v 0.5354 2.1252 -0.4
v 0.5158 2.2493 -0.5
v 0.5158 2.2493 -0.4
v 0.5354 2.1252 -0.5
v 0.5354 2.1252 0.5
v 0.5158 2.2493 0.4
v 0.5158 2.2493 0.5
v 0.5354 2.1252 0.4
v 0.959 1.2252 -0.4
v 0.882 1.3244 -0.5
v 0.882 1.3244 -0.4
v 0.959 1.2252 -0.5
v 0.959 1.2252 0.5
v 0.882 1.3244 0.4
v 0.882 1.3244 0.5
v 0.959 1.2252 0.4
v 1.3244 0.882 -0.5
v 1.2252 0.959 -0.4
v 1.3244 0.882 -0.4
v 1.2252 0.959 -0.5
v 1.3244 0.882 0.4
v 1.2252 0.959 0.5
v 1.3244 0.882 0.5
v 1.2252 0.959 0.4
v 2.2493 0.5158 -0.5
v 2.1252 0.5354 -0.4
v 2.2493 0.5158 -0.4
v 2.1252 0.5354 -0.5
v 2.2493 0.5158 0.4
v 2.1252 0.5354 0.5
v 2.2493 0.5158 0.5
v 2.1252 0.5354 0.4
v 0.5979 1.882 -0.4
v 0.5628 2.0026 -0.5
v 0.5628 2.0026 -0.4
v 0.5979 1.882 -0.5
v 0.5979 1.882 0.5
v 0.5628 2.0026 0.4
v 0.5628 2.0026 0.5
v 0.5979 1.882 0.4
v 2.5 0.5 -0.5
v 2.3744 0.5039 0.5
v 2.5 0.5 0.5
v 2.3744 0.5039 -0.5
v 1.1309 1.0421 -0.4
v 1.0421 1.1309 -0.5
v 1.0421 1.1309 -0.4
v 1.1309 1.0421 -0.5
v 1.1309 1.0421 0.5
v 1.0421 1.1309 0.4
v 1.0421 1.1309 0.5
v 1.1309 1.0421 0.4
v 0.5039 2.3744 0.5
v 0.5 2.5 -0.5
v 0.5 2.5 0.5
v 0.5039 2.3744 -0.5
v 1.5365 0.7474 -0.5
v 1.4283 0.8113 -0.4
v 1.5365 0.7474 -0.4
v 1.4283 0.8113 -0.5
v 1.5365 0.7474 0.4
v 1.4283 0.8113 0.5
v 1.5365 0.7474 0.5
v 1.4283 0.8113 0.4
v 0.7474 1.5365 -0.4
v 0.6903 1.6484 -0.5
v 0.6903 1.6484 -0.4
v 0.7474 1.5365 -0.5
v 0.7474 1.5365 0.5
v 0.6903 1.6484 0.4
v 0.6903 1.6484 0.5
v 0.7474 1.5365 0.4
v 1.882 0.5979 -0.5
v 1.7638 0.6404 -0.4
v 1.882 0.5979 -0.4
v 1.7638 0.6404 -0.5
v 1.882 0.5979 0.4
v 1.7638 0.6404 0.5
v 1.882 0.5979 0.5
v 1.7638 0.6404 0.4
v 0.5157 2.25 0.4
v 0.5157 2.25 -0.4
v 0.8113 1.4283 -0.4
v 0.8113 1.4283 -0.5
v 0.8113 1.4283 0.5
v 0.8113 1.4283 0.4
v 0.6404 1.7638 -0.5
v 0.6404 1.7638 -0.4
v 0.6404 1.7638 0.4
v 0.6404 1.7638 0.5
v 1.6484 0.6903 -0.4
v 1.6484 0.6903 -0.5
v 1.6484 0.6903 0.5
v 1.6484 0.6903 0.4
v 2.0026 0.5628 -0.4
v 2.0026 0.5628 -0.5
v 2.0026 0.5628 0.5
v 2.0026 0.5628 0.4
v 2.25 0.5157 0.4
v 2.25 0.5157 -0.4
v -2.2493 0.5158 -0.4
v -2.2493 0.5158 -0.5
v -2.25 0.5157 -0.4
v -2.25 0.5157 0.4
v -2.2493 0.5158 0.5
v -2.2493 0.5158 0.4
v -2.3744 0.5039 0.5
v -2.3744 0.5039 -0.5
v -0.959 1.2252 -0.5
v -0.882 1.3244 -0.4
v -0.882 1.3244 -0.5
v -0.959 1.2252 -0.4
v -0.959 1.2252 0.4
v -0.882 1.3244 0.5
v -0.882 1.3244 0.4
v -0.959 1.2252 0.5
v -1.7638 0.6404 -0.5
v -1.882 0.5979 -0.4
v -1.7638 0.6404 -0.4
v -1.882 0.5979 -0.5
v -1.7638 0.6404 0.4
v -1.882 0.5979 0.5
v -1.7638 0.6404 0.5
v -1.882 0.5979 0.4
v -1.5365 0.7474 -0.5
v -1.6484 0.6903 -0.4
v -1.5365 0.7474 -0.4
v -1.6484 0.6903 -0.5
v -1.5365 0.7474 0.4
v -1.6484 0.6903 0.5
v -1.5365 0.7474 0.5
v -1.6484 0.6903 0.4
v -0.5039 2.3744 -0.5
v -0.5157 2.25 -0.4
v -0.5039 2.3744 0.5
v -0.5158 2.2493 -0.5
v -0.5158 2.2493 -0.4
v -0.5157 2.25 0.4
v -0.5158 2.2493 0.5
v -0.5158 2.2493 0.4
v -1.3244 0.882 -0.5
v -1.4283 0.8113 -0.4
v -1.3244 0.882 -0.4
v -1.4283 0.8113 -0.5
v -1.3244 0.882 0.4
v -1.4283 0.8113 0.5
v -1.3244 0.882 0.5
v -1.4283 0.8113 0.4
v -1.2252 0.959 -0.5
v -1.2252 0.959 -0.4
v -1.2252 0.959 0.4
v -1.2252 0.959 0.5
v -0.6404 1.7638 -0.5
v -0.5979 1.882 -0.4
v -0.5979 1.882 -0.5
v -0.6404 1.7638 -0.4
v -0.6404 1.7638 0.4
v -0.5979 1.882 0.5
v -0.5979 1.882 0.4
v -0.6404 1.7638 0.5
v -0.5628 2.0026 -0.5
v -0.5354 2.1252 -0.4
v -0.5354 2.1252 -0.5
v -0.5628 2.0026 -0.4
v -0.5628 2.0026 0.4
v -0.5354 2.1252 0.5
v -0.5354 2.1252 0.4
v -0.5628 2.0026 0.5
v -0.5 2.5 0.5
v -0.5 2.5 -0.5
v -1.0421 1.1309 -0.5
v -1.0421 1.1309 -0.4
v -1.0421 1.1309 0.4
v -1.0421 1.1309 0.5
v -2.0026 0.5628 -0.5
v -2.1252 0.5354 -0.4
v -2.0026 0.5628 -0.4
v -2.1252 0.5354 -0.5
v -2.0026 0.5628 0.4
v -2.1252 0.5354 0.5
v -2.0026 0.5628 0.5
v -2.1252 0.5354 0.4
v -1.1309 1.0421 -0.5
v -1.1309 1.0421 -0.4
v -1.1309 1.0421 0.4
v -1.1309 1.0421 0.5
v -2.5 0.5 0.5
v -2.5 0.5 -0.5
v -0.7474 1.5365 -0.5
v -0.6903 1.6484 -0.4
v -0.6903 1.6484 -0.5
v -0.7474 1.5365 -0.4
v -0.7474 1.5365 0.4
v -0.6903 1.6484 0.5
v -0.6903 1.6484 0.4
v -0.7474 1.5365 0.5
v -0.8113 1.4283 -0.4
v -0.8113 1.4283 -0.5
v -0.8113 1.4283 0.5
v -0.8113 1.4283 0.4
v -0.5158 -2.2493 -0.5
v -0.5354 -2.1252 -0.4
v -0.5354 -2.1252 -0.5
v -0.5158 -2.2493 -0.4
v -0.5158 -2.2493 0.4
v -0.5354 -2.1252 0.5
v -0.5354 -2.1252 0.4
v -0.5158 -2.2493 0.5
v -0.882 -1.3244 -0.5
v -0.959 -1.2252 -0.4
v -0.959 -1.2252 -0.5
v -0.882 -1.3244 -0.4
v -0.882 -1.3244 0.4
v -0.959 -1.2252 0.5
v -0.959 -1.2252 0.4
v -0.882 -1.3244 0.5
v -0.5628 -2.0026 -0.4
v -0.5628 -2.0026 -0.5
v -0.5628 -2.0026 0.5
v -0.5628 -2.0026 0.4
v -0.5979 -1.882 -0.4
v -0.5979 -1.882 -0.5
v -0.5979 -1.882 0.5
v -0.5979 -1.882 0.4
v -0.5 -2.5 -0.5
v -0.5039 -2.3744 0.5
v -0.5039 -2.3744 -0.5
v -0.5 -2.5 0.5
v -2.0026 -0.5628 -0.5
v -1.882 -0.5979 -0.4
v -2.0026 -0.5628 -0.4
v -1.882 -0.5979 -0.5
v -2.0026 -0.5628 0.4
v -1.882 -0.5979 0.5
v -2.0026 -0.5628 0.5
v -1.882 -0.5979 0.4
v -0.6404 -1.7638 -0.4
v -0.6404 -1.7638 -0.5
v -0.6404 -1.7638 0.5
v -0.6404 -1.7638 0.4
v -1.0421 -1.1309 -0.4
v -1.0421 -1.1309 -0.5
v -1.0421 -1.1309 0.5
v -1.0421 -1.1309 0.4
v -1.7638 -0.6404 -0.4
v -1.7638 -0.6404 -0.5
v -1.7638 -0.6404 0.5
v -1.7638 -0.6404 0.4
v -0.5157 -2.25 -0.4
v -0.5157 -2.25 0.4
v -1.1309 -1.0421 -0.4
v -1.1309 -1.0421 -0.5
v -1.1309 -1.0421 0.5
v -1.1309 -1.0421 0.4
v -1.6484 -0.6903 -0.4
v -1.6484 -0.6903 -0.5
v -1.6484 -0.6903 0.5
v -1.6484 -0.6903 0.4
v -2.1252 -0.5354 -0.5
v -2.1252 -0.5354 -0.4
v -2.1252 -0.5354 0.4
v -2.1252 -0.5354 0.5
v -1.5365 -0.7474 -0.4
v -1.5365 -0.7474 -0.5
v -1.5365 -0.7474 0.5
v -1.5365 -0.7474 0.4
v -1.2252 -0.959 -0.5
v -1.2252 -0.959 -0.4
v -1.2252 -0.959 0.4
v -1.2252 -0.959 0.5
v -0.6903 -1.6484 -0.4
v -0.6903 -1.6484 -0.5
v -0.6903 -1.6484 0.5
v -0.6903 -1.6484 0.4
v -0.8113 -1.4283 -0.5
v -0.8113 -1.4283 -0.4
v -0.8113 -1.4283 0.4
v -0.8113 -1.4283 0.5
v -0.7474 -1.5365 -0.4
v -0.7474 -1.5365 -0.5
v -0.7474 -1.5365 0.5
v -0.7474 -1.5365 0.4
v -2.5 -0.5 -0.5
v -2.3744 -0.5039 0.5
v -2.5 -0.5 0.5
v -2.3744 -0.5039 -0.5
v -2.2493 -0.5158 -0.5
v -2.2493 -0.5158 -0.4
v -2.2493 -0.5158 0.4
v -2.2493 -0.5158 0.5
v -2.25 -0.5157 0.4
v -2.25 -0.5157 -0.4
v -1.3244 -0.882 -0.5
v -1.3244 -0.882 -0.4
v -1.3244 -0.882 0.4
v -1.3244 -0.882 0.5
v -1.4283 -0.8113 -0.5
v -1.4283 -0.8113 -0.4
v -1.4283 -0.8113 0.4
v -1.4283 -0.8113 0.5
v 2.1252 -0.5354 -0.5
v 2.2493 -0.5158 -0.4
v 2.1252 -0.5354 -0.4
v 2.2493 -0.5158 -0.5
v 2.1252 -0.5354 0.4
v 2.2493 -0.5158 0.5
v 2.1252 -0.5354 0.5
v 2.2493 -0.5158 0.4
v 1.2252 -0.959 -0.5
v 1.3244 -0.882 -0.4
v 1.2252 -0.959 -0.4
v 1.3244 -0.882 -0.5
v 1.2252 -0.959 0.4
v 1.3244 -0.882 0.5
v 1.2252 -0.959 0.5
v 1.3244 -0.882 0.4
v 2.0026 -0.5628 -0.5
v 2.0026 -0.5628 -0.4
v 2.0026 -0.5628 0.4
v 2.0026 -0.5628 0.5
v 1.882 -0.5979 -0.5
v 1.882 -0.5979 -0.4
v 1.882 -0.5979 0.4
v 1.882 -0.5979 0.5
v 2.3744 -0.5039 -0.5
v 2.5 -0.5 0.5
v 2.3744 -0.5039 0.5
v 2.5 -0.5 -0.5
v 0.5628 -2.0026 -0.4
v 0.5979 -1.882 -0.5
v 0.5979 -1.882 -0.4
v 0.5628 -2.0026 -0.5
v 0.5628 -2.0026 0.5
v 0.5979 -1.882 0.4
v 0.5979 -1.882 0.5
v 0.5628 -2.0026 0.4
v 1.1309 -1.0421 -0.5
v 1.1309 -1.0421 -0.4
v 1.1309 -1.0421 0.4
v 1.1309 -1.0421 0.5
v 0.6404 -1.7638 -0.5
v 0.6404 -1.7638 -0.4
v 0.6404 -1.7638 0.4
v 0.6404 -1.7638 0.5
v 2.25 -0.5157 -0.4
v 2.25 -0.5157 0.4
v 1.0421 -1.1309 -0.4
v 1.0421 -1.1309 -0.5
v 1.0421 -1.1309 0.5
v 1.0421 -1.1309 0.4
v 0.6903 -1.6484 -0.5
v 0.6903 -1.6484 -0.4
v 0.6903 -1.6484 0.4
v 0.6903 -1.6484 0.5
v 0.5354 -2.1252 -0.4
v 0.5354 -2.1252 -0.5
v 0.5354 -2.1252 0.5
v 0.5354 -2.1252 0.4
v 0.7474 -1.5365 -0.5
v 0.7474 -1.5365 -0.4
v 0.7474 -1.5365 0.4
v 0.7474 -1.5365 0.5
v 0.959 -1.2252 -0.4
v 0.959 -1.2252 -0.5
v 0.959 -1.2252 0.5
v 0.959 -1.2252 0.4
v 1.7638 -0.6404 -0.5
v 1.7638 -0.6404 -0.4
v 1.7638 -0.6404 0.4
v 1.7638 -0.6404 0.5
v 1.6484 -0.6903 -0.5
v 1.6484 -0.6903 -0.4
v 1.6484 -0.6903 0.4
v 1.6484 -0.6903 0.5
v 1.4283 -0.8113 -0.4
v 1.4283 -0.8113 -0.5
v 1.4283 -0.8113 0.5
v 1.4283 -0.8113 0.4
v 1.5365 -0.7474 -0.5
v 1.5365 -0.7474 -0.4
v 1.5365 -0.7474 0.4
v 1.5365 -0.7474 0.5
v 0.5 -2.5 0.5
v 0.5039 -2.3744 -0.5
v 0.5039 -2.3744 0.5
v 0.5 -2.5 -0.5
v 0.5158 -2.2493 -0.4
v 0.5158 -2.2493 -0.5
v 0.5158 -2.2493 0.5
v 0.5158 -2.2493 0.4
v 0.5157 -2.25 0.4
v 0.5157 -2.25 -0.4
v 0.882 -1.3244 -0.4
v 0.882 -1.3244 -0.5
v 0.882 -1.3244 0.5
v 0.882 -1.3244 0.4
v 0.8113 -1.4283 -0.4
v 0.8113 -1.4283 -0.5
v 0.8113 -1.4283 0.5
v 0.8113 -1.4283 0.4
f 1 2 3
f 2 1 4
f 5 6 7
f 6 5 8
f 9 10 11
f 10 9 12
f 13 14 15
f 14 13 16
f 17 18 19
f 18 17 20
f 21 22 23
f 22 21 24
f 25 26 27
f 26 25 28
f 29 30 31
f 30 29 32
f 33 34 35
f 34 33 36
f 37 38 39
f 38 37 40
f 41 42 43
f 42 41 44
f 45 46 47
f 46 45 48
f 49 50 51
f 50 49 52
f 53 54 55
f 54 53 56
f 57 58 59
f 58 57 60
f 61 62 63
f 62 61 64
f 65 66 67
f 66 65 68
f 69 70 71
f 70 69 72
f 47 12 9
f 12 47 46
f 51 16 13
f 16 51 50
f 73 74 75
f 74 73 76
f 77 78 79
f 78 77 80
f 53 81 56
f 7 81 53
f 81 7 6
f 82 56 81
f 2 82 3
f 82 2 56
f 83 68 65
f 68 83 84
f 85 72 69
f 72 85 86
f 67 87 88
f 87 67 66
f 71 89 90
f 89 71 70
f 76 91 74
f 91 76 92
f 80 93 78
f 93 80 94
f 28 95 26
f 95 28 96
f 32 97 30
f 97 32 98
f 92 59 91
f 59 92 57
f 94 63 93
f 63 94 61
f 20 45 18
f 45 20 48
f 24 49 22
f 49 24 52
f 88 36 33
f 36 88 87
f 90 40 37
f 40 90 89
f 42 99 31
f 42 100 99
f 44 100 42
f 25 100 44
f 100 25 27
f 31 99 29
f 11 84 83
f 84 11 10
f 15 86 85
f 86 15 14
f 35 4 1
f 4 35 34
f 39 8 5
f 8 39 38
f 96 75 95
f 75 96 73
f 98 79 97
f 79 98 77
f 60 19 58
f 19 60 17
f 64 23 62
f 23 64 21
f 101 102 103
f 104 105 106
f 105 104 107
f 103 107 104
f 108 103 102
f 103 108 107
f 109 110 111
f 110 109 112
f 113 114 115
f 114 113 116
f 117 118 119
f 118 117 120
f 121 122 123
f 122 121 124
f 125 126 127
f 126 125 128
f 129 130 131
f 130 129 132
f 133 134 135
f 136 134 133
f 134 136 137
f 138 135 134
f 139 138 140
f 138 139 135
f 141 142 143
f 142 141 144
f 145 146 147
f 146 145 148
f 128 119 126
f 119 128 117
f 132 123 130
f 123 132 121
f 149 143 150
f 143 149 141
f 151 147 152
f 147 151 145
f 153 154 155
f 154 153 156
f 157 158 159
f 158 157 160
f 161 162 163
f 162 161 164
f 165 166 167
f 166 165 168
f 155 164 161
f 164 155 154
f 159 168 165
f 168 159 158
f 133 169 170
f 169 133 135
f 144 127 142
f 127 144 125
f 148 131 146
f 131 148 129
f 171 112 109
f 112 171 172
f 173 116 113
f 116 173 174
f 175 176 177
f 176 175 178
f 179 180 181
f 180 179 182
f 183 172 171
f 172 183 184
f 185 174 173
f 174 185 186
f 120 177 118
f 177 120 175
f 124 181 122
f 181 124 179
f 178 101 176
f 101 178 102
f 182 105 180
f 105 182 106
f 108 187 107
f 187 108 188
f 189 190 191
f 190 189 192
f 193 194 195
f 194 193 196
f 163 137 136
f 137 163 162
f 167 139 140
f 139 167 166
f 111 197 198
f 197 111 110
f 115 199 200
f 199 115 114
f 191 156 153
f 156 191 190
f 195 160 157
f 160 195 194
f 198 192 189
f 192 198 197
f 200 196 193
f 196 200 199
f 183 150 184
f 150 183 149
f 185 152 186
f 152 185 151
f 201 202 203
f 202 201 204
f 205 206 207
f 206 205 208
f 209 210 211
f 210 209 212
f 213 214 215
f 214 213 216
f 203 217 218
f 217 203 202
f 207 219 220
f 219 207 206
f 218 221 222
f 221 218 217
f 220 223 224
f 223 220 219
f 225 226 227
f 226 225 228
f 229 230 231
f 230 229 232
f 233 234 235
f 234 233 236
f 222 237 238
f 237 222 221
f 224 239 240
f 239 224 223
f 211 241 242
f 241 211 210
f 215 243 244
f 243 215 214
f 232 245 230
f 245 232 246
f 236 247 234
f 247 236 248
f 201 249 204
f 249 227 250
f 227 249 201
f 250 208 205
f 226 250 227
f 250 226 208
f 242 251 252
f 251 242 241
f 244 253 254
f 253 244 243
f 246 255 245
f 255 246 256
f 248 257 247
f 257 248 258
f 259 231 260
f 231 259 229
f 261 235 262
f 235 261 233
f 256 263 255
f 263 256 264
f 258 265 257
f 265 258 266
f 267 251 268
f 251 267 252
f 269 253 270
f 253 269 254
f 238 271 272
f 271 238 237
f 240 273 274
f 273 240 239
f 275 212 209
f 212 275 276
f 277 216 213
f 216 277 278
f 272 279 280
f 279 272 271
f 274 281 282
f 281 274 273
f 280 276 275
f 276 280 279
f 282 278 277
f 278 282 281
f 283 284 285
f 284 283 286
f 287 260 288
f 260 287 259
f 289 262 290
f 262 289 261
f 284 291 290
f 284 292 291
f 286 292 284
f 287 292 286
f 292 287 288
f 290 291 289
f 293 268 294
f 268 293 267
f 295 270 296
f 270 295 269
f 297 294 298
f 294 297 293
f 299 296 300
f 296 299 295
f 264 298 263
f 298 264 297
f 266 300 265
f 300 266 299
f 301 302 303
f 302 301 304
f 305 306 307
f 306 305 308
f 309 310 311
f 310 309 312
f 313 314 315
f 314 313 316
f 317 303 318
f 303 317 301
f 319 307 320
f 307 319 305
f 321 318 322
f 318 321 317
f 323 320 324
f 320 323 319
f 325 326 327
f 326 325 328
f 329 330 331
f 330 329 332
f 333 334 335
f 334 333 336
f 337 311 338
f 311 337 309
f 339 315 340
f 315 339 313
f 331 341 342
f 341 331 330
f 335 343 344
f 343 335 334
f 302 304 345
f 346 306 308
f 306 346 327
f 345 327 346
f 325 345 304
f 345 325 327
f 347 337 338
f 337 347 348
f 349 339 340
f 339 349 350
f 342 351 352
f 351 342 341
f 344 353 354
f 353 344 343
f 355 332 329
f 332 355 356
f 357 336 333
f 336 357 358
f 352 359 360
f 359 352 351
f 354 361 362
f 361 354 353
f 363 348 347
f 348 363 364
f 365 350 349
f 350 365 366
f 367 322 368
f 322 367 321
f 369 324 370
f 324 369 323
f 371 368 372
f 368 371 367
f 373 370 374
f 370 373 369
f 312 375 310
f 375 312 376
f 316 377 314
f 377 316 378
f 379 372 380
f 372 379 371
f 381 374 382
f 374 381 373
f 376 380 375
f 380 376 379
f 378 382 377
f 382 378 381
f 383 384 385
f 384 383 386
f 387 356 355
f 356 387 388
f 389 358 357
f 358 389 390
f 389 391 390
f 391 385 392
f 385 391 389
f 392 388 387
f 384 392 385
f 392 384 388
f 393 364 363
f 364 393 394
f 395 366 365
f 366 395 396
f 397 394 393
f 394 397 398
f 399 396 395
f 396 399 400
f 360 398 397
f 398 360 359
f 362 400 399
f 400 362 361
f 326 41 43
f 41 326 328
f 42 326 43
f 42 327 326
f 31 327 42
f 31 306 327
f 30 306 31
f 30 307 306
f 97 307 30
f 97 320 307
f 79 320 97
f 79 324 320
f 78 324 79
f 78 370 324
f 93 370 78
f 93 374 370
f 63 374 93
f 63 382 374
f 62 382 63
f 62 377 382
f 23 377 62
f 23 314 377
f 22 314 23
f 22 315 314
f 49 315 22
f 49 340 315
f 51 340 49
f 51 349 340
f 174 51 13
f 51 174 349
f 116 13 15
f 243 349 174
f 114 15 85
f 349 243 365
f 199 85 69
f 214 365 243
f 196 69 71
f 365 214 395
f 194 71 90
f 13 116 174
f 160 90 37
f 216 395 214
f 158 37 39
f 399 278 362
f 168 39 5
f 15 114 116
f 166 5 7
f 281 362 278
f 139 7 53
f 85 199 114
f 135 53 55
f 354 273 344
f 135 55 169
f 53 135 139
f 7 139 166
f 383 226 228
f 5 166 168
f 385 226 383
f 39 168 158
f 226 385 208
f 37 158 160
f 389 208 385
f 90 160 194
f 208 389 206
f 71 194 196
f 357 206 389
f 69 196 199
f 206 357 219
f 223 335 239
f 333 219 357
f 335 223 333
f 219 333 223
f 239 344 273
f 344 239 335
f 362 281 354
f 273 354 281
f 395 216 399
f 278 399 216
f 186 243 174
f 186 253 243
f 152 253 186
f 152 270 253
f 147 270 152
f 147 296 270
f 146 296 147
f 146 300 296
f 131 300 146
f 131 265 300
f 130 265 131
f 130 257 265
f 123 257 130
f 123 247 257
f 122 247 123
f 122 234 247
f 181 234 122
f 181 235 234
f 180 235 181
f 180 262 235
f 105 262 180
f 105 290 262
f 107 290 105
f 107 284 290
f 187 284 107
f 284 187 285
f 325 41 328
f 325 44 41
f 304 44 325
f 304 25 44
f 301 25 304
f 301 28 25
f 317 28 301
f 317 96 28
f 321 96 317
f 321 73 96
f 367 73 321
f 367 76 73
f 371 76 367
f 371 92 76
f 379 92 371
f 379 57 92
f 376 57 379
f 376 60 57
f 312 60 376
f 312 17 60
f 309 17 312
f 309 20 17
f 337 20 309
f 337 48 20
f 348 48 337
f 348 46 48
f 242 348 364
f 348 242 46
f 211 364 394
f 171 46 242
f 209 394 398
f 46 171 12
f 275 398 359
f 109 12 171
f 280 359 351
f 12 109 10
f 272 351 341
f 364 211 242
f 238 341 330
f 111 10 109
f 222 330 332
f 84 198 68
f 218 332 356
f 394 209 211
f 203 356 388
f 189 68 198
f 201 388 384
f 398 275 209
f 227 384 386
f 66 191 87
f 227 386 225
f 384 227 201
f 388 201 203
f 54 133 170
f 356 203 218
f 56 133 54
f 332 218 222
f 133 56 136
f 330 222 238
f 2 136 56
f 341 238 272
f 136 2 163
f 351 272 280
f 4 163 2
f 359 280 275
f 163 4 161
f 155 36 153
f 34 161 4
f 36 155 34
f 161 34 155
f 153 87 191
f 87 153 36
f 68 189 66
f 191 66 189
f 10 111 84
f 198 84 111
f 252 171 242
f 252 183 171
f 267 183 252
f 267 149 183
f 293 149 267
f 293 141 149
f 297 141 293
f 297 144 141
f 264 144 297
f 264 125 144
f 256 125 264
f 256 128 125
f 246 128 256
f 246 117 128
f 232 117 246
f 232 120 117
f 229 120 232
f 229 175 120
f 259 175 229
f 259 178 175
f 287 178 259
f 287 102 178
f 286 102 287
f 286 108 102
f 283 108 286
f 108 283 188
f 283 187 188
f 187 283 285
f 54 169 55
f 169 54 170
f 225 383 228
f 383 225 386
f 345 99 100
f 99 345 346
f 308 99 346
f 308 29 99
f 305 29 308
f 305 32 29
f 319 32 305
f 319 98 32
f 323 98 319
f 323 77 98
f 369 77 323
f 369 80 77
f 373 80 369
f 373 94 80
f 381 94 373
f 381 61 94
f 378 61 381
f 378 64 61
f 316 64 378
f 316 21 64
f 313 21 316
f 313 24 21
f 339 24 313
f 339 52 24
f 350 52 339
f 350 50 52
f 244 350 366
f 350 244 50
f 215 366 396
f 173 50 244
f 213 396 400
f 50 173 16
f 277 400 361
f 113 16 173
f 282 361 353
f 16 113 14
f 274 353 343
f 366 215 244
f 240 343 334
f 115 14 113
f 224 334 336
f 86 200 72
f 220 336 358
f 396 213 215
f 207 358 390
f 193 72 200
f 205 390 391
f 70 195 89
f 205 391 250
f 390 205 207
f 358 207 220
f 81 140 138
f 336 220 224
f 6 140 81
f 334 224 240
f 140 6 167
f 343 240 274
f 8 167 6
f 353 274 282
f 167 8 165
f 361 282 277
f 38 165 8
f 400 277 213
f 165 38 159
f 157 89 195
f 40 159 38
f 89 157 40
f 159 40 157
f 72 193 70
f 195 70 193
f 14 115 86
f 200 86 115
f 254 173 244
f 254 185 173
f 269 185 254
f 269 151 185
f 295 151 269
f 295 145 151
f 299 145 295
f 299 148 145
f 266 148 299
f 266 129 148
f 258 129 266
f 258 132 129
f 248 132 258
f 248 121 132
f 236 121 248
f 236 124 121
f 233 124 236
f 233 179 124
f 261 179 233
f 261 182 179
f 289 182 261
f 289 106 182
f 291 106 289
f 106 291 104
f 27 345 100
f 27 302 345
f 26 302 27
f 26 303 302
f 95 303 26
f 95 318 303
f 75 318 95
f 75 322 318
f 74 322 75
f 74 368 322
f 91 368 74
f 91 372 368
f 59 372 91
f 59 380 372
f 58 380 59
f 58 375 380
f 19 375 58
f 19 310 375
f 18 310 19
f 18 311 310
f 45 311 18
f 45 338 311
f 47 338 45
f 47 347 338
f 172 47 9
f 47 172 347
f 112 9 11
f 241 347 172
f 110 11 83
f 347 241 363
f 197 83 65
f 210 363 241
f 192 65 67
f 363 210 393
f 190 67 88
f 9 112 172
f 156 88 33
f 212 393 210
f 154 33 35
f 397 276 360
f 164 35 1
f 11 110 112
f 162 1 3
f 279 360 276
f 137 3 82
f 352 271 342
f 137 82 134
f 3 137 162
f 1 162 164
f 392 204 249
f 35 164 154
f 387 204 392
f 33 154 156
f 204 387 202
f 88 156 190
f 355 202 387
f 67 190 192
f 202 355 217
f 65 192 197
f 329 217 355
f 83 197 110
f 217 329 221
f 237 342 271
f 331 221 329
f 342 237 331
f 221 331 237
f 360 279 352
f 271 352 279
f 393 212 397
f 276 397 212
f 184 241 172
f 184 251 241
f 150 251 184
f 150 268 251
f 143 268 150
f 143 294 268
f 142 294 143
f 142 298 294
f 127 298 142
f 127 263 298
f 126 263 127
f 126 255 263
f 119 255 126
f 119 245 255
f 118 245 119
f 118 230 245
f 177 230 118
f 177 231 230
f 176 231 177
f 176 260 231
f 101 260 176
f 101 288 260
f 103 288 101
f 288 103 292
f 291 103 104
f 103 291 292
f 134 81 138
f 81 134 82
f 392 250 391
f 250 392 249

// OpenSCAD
difference(){
	cube([5,5,1], center = true);

	cube([4.5,4.5,0.8], center = true);

		for(i = [0: 90: 360]){

	    	rotate([0,0,i]){

	    	translate([2.5,2.5,0]){

				cylinder(r = 2,h = 2, center = true, $fn =100);

			}
		}
	}
}


	
